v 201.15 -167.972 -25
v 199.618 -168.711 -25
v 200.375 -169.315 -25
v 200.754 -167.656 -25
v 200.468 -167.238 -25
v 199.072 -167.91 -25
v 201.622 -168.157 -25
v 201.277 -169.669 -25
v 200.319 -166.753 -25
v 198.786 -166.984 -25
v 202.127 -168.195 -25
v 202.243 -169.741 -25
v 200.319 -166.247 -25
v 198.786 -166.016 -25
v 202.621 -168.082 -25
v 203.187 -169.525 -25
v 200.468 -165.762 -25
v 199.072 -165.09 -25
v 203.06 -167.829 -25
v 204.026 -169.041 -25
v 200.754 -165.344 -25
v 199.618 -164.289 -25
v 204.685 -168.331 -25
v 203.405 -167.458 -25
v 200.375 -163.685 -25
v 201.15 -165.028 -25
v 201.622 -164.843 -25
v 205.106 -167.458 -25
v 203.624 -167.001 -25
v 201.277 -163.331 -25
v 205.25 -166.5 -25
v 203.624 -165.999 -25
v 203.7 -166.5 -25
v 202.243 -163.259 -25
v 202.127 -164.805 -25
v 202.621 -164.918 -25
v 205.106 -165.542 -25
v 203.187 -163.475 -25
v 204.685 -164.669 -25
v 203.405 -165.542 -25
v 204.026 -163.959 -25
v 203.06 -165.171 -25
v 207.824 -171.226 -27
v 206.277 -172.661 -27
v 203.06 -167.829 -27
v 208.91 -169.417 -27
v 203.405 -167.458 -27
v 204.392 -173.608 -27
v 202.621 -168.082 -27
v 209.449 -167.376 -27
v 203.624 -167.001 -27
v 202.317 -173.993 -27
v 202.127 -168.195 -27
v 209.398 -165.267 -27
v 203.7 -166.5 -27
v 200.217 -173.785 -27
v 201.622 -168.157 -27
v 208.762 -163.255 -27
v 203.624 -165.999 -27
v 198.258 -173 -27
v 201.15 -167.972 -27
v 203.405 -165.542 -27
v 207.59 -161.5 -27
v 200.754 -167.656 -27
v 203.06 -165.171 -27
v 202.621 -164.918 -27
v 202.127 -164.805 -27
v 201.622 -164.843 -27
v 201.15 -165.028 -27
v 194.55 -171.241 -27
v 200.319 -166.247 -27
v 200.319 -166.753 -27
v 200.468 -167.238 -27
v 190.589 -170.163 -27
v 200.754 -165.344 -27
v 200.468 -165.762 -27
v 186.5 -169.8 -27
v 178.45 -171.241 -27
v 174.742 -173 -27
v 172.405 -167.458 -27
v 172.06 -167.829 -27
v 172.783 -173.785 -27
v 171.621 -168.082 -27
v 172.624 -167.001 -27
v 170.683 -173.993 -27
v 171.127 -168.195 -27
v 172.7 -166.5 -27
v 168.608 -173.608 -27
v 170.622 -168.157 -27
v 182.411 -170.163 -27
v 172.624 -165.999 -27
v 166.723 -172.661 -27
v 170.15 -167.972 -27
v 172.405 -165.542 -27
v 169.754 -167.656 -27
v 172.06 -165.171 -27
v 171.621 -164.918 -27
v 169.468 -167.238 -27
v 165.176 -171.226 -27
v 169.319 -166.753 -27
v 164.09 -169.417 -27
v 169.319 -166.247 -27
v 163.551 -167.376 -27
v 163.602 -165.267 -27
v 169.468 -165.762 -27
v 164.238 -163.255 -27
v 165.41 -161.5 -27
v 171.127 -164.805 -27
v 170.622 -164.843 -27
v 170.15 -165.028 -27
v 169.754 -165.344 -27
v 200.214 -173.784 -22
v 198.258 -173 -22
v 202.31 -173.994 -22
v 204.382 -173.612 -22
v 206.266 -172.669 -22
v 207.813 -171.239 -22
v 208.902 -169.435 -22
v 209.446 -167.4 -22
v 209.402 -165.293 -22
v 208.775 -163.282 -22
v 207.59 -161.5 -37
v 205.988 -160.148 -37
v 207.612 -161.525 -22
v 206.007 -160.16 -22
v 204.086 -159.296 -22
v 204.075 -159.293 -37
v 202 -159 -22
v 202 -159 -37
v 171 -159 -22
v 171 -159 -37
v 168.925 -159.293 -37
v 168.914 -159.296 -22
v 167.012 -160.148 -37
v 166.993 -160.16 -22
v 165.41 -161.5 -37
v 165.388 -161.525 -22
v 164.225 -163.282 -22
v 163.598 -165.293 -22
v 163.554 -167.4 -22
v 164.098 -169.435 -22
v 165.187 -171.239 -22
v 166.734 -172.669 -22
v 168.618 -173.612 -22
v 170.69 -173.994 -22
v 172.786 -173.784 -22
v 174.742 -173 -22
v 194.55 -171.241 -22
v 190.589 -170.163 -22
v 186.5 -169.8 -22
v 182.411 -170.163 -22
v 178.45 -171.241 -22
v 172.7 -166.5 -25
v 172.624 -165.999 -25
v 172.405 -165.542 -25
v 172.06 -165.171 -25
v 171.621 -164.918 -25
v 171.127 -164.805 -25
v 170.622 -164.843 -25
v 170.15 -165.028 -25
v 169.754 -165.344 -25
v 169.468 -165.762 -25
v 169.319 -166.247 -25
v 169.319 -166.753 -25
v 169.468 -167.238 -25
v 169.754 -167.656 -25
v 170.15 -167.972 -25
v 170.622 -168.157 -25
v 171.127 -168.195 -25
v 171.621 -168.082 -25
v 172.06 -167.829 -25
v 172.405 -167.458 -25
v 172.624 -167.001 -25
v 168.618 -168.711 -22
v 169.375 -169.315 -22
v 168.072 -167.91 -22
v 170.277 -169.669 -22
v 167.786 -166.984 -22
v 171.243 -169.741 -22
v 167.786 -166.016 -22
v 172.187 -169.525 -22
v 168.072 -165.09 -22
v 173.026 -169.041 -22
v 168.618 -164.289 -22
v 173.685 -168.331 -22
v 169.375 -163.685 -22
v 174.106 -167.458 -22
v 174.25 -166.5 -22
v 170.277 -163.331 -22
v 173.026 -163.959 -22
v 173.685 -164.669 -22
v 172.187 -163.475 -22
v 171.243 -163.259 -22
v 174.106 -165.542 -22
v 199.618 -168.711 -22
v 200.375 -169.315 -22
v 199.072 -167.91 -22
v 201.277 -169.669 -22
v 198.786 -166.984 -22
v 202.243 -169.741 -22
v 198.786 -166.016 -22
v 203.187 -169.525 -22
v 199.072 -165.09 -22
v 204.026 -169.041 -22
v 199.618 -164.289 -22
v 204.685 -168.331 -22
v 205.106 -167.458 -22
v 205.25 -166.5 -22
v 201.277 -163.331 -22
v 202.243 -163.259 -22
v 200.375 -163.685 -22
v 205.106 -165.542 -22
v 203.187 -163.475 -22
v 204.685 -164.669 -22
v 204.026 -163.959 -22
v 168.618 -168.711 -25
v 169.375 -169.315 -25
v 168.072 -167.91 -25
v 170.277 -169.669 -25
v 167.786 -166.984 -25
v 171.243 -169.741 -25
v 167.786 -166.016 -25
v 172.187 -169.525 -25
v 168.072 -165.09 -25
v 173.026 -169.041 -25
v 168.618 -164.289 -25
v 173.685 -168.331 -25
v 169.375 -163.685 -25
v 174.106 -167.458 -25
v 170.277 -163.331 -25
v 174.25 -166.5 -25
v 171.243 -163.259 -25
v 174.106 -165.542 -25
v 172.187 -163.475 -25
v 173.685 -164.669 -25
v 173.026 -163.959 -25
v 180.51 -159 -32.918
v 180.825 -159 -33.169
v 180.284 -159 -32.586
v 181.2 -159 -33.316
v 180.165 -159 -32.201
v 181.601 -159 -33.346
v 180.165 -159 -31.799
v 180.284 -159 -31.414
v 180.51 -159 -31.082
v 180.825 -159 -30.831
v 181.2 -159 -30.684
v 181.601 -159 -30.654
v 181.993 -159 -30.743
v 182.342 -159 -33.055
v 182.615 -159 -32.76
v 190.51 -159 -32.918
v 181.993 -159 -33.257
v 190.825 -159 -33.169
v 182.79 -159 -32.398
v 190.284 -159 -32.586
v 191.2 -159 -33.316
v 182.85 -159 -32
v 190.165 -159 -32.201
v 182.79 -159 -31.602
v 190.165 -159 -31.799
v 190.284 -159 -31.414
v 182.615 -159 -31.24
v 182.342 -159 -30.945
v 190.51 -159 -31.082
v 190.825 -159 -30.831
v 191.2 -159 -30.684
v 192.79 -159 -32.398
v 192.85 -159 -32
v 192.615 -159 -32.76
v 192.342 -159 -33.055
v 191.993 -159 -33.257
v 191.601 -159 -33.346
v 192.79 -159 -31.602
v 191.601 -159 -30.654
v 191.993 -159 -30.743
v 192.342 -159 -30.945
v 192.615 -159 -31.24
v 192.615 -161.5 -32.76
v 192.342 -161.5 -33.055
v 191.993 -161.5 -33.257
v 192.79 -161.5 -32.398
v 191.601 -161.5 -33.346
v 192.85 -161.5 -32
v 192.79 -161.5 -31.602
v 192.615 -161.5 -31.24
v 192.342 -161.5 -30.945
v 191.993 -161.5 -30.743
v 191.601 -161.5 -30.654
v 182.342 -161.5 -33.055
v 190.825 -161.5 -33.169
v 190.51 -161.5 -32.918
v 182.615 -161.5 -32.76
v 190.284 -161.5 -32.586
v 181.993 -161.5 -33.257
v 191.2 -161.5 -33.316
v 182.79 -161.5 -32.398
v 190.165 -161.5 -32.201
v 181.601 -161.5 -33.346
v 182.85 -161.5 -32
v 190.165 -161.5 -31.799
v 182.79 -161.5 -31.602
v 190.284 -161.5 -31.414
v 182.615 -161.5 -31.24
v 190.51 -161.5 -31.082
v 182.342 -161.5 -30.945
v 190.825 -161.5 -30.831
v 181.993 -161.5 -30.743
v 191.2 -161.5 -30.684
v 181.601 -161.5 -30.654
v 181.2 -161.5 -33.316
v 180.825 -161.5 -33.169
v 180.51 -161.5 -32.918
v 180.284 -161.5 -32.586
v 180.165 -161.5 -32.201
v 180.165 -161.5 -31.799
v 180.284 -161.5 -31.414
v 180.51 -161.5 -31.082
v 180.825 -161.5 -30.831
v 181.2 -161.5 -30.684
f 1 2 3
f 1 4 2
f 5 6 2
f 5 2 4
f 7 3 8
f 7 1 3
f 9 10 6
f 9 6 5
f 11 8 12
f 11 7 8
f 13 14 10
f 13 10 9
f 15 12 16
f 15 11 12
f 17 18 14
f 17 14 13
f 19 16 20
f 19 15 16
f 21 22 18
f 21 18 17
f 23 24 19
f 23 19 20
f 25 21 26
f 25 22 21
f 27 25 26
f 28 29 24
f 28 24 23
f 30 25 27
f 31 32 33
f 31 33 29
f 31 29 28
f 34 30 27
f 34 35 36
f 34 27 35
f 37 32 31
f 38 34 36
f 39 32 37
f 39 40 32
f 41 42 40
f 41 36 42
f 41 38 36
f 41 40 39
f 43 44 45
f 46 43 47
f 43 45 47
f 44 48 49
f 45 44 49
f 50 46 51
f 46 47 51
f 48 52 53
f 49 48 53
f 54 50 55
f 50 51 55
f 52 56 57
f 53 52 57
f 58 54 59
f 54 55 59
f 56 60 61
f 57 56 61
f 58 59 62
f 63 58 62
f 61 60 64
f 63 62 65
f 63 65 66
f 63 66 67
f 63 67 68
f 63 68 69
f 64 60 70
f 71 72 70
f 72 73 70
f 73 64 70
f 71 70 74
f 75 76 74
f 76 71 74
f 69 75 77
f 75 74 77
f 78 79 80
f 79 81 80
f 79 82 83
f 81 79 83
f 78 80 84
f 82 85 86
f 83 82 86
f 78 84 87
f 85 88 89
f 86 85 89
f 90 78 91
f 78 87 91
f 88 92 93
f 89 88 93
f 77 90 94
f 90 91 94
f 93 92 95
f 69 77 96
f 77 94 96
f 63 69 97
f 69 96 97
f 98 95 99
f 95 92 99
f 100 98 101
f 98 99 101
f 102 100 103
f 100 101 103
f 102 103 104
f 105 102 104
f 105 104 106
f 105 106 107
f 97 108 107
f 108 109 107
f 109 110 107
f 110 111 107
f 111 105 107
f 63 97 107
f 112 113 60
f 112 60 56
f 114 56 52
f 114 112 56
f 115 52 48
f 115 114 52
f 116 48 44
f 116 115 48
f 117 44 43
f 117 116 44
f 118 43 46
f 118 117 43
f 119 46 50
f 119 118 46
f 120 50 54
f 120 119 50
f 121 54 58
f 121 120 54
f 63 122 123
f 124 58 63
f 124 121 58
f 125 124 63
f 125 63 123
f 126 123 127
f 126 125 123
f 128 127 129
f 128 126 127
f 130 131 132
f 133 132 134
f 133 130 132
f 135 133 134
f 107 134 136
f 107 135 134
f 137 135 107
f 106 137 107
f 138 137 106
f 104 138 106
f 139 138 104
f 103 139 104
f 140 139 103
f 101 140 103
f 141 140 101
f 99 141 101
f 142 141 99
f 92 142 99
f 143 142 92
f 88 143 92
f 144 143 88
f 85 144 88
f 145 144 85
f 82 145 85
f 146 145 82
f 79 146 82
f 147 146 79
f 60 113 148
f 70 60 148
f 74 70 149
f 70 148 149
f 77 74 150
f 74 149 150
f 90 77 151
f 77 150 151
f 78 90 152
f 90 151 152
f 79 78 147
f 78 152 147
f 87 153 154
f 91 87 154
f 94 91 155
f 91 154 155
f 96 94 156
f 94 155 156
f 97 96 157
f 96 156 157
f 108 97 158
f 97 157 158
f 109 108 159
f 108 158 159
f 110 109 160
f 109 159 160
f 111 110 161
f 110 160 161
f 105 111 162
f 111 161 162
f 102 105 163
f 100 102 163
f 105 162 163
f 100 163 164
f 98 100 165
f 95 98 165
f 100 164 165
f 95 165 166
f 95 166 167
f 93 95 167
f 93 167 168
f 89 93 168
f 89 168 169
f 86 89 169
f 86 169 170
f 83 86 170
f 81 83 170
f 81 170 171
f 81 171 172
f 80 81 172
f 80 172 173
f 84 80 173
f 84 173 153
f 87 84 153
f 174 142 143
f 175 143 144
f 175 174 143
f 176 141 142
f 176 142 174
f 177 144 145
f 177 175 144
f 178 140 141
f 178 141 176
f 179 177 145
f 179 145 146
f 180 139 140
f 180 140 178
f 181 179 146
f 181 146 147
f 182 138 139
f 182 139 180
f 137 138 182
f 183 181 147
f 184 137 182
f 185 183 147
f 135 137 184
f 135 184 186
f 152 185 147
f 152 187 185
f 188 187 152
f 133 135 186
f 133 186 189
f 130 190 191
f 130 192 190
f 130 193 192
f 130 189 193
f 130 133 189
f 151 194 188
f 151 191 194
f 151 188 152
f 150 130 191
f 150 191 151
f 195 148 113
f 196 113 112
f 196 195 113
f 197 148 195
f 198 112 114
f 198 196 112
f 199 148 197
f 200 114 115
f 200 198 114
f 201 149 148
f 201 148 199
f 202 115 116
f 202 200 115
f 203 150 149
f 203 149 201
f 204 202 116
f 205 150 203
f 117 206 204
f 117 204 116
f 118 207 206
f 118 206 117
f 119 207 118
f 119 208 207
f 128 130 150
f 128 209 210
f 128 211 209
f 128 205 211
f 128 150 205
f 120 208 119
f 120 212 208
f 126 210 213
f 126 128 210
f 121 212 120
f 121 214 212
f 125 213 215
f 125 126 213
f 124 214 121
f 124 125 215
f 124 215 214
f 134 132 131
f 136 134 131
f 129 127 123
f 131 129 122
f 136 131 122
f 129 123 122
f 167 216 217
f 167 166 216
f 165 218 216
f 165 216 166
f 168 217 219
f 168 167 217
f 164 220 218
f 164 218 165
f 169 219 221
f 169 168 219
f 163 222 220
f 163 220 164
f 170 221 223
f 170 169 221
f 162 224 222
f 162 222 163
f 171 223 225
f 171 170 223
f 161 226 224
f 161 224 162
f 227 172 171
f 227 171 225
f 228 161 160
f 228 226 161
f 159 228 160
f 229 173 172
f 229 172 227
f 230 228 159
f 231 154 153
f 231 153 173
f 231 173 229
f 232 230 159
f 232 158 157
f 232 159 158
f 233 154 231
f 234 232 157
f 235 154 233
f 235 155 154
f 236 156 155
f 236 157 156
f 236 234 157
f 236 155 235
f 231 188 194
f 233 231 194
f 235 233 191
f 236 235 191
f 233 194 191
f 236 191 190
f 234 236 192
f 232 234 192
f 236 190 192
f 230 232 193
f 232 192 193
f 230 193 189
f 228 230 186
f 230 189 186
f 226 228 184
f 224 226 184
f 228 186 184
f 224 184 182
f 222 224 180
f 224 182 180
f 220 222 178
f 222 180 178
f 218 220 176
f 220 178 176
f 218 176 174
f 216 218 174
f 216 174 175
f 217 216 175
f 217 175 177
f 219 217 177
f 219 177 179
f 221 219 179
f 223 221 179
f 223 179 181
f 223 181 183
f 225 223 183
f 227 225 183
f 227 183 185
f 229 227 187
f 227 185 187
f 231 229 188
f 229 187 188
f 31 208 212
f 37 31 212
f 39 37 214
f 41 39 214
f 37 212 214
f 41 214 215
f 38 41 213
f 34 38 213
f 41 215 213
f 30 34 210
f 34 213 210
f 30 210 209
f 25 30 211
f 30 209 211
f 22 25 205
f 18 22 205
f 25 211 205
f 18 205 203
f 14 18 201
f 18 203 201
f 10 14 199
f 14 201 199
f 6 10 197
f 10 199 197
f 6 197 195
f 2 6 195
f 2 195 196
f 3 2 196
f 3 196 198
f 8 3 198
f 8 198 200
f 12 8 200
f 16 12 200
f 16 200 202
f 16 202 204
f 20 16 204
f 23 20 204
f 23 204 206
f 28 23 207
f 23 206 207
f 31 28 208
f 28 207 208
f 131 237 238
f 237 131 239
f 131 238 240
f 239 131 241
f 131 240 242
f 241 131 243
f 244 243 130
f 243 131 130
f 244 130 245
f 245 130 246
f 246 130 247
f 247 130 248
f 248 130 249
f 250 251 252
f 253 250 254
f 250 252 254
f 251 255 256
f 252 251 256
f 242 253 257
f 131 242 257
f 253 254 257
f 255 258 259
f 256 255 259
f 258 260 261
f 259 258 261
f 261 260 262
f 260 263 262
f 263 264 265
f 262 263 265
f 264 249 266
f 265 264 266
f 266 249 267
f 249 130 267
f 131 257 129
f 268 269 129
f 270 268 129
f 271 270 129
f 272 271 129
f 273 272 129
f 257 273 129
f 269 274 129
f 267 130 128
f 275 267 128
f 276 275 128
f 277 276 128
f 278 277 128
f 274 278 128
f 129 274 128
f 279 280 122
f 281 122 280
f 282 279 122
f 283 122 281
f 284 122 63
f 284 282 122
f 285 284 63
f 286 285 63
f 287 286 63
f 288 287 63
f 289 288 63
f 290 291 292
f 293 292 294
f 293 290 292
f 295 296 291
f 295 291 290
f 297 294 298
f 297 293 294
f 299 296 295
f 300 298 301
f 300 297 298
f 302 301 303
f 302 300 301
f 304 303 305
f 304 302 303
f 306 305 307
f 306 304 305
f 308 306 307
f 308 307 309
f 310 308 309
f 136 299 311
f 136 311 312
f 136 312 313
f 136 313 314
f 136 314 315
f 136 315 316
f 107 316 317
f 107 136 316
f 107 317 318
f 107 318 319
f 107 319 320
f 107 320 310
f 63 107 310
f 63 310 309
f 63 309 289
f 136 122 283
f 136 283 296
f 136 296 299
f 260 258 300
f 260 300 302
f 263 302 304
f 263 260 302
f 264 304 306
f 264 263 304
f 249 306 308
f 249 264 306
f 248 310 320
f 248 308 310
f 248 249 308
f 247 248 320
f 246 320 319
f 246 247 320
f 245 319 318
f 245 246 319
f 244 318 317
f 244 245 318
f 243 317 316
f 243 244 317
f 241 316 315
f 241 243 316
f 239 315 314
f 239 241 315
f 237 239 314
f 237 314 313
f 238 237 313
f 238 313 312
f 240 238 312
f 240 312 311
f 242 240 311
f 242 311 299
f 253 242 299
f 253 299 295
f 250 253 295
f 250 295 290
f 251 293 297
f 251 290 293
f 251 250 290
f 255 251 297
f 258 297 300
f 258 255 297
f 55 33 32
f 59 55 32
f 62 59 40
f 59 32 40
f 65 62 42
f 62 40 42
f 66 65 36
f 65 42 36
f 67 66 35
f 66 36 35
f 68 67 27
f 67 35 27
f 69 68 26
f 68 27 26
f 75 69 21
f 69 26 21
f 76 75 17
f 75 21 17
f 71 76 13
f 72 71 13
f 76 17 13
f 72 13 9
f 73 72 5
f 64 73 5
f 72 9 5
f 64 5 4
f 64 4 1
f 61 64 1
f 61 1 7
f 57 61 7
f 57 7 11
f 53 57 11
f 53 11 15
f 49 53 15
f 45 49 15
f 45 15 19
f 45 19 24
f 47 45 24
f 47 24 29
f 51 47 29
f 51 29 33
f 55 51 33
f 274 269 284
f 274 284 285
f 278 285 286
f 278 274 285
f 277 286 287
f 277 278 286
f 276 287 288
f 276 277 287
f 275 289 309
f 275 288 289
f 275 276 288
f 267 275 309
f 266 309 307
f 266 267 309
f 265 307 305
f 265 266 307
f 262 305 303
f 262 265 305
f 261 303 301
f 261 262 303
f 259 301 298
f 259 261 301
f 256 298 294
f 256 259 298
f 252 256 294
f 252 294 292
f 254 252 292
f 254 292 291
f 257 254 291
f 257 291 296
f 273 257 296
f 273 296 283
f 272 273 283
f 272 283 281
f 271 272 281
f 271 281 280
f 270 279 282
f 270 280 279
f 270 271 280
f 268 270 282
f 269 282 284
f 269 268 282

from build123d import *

# Parameters (mm, degrees)
SKETCH021_R     = 1.7
PAD003_DEPTH    = 15
SKETCH022_W     = 13
SKETCH022_H     = 11
POCKET018_DEPTH = 208.501
SKETCH023_R     = 1.35
POCKET019_DEPTH = 175.001
SKETCH024_R     = 3.25
POCKET020_DEPTH = 3


with BuildPart() as part:
    # Sketch021 → Pad003 (new body)
    with BuildSketch(Plane.XY):
        with BuildLine():
            ThreePointArc((170, -160), (162.754312, -169.436492), (173.741657, -174))
            ThreePointArc((197.258343, -174), (185.5, -170.799599), (173.741657, -174))
            ThreePointArc((197.258343, -174), (208.245688, -169.436492), (201, -160))
            Line((170, -160), (201, -160))
        make_face()
        with Locations((170, -167.5)):
            Circle(SKETCH021_R, mode=Mode.SUBTRACT)
        with Locations((201, -167.5)):
            Circle(SKETCH021_R, mode=Mode.SUBTRACT)
    extrude(amount=-PAD003_DEPTH)

    # Sketch022 → Pocket018 (cut, through all)
    with BuildSketch(Plane.YZ):
        with Locations((-169, -10.5)):
            Rectangle(SKETCH022_W, SKETCH022_H)
    extrude(amount=POCKET018_DEPTH, mode=Mode.SUBTRACT)

    # Sketch023 → Pocket019 (cut, through all)
    with BuildSketch(Plane.XZ):
        with Locations((180.5, -10)):
            Circle(SKETCH023_R)
        with Locations((190.5, -10)):
            Circle(SKETCH023_R)
    extrude(amount=POCKET019_DEPTH, mode=Mode.SUBTRACT)

    # Sketch024 → Pocket020 (cut)
    with BuildSketch(Plane.XY):
        with Locations((170, -167.5)):
            Circle(SKETCH024_R)
        with Locations((201, -167.5)):
            Circle(SKETCH024_R)
    extrude(amount=-POCKET020_DEPTH, mode=Mode.SUBTRACT)


with BuildPart() as part_1:
    # Body003 placement: moved
    add(part.part.moved(Location((1, 1, -22))))


solid = part_1.part
